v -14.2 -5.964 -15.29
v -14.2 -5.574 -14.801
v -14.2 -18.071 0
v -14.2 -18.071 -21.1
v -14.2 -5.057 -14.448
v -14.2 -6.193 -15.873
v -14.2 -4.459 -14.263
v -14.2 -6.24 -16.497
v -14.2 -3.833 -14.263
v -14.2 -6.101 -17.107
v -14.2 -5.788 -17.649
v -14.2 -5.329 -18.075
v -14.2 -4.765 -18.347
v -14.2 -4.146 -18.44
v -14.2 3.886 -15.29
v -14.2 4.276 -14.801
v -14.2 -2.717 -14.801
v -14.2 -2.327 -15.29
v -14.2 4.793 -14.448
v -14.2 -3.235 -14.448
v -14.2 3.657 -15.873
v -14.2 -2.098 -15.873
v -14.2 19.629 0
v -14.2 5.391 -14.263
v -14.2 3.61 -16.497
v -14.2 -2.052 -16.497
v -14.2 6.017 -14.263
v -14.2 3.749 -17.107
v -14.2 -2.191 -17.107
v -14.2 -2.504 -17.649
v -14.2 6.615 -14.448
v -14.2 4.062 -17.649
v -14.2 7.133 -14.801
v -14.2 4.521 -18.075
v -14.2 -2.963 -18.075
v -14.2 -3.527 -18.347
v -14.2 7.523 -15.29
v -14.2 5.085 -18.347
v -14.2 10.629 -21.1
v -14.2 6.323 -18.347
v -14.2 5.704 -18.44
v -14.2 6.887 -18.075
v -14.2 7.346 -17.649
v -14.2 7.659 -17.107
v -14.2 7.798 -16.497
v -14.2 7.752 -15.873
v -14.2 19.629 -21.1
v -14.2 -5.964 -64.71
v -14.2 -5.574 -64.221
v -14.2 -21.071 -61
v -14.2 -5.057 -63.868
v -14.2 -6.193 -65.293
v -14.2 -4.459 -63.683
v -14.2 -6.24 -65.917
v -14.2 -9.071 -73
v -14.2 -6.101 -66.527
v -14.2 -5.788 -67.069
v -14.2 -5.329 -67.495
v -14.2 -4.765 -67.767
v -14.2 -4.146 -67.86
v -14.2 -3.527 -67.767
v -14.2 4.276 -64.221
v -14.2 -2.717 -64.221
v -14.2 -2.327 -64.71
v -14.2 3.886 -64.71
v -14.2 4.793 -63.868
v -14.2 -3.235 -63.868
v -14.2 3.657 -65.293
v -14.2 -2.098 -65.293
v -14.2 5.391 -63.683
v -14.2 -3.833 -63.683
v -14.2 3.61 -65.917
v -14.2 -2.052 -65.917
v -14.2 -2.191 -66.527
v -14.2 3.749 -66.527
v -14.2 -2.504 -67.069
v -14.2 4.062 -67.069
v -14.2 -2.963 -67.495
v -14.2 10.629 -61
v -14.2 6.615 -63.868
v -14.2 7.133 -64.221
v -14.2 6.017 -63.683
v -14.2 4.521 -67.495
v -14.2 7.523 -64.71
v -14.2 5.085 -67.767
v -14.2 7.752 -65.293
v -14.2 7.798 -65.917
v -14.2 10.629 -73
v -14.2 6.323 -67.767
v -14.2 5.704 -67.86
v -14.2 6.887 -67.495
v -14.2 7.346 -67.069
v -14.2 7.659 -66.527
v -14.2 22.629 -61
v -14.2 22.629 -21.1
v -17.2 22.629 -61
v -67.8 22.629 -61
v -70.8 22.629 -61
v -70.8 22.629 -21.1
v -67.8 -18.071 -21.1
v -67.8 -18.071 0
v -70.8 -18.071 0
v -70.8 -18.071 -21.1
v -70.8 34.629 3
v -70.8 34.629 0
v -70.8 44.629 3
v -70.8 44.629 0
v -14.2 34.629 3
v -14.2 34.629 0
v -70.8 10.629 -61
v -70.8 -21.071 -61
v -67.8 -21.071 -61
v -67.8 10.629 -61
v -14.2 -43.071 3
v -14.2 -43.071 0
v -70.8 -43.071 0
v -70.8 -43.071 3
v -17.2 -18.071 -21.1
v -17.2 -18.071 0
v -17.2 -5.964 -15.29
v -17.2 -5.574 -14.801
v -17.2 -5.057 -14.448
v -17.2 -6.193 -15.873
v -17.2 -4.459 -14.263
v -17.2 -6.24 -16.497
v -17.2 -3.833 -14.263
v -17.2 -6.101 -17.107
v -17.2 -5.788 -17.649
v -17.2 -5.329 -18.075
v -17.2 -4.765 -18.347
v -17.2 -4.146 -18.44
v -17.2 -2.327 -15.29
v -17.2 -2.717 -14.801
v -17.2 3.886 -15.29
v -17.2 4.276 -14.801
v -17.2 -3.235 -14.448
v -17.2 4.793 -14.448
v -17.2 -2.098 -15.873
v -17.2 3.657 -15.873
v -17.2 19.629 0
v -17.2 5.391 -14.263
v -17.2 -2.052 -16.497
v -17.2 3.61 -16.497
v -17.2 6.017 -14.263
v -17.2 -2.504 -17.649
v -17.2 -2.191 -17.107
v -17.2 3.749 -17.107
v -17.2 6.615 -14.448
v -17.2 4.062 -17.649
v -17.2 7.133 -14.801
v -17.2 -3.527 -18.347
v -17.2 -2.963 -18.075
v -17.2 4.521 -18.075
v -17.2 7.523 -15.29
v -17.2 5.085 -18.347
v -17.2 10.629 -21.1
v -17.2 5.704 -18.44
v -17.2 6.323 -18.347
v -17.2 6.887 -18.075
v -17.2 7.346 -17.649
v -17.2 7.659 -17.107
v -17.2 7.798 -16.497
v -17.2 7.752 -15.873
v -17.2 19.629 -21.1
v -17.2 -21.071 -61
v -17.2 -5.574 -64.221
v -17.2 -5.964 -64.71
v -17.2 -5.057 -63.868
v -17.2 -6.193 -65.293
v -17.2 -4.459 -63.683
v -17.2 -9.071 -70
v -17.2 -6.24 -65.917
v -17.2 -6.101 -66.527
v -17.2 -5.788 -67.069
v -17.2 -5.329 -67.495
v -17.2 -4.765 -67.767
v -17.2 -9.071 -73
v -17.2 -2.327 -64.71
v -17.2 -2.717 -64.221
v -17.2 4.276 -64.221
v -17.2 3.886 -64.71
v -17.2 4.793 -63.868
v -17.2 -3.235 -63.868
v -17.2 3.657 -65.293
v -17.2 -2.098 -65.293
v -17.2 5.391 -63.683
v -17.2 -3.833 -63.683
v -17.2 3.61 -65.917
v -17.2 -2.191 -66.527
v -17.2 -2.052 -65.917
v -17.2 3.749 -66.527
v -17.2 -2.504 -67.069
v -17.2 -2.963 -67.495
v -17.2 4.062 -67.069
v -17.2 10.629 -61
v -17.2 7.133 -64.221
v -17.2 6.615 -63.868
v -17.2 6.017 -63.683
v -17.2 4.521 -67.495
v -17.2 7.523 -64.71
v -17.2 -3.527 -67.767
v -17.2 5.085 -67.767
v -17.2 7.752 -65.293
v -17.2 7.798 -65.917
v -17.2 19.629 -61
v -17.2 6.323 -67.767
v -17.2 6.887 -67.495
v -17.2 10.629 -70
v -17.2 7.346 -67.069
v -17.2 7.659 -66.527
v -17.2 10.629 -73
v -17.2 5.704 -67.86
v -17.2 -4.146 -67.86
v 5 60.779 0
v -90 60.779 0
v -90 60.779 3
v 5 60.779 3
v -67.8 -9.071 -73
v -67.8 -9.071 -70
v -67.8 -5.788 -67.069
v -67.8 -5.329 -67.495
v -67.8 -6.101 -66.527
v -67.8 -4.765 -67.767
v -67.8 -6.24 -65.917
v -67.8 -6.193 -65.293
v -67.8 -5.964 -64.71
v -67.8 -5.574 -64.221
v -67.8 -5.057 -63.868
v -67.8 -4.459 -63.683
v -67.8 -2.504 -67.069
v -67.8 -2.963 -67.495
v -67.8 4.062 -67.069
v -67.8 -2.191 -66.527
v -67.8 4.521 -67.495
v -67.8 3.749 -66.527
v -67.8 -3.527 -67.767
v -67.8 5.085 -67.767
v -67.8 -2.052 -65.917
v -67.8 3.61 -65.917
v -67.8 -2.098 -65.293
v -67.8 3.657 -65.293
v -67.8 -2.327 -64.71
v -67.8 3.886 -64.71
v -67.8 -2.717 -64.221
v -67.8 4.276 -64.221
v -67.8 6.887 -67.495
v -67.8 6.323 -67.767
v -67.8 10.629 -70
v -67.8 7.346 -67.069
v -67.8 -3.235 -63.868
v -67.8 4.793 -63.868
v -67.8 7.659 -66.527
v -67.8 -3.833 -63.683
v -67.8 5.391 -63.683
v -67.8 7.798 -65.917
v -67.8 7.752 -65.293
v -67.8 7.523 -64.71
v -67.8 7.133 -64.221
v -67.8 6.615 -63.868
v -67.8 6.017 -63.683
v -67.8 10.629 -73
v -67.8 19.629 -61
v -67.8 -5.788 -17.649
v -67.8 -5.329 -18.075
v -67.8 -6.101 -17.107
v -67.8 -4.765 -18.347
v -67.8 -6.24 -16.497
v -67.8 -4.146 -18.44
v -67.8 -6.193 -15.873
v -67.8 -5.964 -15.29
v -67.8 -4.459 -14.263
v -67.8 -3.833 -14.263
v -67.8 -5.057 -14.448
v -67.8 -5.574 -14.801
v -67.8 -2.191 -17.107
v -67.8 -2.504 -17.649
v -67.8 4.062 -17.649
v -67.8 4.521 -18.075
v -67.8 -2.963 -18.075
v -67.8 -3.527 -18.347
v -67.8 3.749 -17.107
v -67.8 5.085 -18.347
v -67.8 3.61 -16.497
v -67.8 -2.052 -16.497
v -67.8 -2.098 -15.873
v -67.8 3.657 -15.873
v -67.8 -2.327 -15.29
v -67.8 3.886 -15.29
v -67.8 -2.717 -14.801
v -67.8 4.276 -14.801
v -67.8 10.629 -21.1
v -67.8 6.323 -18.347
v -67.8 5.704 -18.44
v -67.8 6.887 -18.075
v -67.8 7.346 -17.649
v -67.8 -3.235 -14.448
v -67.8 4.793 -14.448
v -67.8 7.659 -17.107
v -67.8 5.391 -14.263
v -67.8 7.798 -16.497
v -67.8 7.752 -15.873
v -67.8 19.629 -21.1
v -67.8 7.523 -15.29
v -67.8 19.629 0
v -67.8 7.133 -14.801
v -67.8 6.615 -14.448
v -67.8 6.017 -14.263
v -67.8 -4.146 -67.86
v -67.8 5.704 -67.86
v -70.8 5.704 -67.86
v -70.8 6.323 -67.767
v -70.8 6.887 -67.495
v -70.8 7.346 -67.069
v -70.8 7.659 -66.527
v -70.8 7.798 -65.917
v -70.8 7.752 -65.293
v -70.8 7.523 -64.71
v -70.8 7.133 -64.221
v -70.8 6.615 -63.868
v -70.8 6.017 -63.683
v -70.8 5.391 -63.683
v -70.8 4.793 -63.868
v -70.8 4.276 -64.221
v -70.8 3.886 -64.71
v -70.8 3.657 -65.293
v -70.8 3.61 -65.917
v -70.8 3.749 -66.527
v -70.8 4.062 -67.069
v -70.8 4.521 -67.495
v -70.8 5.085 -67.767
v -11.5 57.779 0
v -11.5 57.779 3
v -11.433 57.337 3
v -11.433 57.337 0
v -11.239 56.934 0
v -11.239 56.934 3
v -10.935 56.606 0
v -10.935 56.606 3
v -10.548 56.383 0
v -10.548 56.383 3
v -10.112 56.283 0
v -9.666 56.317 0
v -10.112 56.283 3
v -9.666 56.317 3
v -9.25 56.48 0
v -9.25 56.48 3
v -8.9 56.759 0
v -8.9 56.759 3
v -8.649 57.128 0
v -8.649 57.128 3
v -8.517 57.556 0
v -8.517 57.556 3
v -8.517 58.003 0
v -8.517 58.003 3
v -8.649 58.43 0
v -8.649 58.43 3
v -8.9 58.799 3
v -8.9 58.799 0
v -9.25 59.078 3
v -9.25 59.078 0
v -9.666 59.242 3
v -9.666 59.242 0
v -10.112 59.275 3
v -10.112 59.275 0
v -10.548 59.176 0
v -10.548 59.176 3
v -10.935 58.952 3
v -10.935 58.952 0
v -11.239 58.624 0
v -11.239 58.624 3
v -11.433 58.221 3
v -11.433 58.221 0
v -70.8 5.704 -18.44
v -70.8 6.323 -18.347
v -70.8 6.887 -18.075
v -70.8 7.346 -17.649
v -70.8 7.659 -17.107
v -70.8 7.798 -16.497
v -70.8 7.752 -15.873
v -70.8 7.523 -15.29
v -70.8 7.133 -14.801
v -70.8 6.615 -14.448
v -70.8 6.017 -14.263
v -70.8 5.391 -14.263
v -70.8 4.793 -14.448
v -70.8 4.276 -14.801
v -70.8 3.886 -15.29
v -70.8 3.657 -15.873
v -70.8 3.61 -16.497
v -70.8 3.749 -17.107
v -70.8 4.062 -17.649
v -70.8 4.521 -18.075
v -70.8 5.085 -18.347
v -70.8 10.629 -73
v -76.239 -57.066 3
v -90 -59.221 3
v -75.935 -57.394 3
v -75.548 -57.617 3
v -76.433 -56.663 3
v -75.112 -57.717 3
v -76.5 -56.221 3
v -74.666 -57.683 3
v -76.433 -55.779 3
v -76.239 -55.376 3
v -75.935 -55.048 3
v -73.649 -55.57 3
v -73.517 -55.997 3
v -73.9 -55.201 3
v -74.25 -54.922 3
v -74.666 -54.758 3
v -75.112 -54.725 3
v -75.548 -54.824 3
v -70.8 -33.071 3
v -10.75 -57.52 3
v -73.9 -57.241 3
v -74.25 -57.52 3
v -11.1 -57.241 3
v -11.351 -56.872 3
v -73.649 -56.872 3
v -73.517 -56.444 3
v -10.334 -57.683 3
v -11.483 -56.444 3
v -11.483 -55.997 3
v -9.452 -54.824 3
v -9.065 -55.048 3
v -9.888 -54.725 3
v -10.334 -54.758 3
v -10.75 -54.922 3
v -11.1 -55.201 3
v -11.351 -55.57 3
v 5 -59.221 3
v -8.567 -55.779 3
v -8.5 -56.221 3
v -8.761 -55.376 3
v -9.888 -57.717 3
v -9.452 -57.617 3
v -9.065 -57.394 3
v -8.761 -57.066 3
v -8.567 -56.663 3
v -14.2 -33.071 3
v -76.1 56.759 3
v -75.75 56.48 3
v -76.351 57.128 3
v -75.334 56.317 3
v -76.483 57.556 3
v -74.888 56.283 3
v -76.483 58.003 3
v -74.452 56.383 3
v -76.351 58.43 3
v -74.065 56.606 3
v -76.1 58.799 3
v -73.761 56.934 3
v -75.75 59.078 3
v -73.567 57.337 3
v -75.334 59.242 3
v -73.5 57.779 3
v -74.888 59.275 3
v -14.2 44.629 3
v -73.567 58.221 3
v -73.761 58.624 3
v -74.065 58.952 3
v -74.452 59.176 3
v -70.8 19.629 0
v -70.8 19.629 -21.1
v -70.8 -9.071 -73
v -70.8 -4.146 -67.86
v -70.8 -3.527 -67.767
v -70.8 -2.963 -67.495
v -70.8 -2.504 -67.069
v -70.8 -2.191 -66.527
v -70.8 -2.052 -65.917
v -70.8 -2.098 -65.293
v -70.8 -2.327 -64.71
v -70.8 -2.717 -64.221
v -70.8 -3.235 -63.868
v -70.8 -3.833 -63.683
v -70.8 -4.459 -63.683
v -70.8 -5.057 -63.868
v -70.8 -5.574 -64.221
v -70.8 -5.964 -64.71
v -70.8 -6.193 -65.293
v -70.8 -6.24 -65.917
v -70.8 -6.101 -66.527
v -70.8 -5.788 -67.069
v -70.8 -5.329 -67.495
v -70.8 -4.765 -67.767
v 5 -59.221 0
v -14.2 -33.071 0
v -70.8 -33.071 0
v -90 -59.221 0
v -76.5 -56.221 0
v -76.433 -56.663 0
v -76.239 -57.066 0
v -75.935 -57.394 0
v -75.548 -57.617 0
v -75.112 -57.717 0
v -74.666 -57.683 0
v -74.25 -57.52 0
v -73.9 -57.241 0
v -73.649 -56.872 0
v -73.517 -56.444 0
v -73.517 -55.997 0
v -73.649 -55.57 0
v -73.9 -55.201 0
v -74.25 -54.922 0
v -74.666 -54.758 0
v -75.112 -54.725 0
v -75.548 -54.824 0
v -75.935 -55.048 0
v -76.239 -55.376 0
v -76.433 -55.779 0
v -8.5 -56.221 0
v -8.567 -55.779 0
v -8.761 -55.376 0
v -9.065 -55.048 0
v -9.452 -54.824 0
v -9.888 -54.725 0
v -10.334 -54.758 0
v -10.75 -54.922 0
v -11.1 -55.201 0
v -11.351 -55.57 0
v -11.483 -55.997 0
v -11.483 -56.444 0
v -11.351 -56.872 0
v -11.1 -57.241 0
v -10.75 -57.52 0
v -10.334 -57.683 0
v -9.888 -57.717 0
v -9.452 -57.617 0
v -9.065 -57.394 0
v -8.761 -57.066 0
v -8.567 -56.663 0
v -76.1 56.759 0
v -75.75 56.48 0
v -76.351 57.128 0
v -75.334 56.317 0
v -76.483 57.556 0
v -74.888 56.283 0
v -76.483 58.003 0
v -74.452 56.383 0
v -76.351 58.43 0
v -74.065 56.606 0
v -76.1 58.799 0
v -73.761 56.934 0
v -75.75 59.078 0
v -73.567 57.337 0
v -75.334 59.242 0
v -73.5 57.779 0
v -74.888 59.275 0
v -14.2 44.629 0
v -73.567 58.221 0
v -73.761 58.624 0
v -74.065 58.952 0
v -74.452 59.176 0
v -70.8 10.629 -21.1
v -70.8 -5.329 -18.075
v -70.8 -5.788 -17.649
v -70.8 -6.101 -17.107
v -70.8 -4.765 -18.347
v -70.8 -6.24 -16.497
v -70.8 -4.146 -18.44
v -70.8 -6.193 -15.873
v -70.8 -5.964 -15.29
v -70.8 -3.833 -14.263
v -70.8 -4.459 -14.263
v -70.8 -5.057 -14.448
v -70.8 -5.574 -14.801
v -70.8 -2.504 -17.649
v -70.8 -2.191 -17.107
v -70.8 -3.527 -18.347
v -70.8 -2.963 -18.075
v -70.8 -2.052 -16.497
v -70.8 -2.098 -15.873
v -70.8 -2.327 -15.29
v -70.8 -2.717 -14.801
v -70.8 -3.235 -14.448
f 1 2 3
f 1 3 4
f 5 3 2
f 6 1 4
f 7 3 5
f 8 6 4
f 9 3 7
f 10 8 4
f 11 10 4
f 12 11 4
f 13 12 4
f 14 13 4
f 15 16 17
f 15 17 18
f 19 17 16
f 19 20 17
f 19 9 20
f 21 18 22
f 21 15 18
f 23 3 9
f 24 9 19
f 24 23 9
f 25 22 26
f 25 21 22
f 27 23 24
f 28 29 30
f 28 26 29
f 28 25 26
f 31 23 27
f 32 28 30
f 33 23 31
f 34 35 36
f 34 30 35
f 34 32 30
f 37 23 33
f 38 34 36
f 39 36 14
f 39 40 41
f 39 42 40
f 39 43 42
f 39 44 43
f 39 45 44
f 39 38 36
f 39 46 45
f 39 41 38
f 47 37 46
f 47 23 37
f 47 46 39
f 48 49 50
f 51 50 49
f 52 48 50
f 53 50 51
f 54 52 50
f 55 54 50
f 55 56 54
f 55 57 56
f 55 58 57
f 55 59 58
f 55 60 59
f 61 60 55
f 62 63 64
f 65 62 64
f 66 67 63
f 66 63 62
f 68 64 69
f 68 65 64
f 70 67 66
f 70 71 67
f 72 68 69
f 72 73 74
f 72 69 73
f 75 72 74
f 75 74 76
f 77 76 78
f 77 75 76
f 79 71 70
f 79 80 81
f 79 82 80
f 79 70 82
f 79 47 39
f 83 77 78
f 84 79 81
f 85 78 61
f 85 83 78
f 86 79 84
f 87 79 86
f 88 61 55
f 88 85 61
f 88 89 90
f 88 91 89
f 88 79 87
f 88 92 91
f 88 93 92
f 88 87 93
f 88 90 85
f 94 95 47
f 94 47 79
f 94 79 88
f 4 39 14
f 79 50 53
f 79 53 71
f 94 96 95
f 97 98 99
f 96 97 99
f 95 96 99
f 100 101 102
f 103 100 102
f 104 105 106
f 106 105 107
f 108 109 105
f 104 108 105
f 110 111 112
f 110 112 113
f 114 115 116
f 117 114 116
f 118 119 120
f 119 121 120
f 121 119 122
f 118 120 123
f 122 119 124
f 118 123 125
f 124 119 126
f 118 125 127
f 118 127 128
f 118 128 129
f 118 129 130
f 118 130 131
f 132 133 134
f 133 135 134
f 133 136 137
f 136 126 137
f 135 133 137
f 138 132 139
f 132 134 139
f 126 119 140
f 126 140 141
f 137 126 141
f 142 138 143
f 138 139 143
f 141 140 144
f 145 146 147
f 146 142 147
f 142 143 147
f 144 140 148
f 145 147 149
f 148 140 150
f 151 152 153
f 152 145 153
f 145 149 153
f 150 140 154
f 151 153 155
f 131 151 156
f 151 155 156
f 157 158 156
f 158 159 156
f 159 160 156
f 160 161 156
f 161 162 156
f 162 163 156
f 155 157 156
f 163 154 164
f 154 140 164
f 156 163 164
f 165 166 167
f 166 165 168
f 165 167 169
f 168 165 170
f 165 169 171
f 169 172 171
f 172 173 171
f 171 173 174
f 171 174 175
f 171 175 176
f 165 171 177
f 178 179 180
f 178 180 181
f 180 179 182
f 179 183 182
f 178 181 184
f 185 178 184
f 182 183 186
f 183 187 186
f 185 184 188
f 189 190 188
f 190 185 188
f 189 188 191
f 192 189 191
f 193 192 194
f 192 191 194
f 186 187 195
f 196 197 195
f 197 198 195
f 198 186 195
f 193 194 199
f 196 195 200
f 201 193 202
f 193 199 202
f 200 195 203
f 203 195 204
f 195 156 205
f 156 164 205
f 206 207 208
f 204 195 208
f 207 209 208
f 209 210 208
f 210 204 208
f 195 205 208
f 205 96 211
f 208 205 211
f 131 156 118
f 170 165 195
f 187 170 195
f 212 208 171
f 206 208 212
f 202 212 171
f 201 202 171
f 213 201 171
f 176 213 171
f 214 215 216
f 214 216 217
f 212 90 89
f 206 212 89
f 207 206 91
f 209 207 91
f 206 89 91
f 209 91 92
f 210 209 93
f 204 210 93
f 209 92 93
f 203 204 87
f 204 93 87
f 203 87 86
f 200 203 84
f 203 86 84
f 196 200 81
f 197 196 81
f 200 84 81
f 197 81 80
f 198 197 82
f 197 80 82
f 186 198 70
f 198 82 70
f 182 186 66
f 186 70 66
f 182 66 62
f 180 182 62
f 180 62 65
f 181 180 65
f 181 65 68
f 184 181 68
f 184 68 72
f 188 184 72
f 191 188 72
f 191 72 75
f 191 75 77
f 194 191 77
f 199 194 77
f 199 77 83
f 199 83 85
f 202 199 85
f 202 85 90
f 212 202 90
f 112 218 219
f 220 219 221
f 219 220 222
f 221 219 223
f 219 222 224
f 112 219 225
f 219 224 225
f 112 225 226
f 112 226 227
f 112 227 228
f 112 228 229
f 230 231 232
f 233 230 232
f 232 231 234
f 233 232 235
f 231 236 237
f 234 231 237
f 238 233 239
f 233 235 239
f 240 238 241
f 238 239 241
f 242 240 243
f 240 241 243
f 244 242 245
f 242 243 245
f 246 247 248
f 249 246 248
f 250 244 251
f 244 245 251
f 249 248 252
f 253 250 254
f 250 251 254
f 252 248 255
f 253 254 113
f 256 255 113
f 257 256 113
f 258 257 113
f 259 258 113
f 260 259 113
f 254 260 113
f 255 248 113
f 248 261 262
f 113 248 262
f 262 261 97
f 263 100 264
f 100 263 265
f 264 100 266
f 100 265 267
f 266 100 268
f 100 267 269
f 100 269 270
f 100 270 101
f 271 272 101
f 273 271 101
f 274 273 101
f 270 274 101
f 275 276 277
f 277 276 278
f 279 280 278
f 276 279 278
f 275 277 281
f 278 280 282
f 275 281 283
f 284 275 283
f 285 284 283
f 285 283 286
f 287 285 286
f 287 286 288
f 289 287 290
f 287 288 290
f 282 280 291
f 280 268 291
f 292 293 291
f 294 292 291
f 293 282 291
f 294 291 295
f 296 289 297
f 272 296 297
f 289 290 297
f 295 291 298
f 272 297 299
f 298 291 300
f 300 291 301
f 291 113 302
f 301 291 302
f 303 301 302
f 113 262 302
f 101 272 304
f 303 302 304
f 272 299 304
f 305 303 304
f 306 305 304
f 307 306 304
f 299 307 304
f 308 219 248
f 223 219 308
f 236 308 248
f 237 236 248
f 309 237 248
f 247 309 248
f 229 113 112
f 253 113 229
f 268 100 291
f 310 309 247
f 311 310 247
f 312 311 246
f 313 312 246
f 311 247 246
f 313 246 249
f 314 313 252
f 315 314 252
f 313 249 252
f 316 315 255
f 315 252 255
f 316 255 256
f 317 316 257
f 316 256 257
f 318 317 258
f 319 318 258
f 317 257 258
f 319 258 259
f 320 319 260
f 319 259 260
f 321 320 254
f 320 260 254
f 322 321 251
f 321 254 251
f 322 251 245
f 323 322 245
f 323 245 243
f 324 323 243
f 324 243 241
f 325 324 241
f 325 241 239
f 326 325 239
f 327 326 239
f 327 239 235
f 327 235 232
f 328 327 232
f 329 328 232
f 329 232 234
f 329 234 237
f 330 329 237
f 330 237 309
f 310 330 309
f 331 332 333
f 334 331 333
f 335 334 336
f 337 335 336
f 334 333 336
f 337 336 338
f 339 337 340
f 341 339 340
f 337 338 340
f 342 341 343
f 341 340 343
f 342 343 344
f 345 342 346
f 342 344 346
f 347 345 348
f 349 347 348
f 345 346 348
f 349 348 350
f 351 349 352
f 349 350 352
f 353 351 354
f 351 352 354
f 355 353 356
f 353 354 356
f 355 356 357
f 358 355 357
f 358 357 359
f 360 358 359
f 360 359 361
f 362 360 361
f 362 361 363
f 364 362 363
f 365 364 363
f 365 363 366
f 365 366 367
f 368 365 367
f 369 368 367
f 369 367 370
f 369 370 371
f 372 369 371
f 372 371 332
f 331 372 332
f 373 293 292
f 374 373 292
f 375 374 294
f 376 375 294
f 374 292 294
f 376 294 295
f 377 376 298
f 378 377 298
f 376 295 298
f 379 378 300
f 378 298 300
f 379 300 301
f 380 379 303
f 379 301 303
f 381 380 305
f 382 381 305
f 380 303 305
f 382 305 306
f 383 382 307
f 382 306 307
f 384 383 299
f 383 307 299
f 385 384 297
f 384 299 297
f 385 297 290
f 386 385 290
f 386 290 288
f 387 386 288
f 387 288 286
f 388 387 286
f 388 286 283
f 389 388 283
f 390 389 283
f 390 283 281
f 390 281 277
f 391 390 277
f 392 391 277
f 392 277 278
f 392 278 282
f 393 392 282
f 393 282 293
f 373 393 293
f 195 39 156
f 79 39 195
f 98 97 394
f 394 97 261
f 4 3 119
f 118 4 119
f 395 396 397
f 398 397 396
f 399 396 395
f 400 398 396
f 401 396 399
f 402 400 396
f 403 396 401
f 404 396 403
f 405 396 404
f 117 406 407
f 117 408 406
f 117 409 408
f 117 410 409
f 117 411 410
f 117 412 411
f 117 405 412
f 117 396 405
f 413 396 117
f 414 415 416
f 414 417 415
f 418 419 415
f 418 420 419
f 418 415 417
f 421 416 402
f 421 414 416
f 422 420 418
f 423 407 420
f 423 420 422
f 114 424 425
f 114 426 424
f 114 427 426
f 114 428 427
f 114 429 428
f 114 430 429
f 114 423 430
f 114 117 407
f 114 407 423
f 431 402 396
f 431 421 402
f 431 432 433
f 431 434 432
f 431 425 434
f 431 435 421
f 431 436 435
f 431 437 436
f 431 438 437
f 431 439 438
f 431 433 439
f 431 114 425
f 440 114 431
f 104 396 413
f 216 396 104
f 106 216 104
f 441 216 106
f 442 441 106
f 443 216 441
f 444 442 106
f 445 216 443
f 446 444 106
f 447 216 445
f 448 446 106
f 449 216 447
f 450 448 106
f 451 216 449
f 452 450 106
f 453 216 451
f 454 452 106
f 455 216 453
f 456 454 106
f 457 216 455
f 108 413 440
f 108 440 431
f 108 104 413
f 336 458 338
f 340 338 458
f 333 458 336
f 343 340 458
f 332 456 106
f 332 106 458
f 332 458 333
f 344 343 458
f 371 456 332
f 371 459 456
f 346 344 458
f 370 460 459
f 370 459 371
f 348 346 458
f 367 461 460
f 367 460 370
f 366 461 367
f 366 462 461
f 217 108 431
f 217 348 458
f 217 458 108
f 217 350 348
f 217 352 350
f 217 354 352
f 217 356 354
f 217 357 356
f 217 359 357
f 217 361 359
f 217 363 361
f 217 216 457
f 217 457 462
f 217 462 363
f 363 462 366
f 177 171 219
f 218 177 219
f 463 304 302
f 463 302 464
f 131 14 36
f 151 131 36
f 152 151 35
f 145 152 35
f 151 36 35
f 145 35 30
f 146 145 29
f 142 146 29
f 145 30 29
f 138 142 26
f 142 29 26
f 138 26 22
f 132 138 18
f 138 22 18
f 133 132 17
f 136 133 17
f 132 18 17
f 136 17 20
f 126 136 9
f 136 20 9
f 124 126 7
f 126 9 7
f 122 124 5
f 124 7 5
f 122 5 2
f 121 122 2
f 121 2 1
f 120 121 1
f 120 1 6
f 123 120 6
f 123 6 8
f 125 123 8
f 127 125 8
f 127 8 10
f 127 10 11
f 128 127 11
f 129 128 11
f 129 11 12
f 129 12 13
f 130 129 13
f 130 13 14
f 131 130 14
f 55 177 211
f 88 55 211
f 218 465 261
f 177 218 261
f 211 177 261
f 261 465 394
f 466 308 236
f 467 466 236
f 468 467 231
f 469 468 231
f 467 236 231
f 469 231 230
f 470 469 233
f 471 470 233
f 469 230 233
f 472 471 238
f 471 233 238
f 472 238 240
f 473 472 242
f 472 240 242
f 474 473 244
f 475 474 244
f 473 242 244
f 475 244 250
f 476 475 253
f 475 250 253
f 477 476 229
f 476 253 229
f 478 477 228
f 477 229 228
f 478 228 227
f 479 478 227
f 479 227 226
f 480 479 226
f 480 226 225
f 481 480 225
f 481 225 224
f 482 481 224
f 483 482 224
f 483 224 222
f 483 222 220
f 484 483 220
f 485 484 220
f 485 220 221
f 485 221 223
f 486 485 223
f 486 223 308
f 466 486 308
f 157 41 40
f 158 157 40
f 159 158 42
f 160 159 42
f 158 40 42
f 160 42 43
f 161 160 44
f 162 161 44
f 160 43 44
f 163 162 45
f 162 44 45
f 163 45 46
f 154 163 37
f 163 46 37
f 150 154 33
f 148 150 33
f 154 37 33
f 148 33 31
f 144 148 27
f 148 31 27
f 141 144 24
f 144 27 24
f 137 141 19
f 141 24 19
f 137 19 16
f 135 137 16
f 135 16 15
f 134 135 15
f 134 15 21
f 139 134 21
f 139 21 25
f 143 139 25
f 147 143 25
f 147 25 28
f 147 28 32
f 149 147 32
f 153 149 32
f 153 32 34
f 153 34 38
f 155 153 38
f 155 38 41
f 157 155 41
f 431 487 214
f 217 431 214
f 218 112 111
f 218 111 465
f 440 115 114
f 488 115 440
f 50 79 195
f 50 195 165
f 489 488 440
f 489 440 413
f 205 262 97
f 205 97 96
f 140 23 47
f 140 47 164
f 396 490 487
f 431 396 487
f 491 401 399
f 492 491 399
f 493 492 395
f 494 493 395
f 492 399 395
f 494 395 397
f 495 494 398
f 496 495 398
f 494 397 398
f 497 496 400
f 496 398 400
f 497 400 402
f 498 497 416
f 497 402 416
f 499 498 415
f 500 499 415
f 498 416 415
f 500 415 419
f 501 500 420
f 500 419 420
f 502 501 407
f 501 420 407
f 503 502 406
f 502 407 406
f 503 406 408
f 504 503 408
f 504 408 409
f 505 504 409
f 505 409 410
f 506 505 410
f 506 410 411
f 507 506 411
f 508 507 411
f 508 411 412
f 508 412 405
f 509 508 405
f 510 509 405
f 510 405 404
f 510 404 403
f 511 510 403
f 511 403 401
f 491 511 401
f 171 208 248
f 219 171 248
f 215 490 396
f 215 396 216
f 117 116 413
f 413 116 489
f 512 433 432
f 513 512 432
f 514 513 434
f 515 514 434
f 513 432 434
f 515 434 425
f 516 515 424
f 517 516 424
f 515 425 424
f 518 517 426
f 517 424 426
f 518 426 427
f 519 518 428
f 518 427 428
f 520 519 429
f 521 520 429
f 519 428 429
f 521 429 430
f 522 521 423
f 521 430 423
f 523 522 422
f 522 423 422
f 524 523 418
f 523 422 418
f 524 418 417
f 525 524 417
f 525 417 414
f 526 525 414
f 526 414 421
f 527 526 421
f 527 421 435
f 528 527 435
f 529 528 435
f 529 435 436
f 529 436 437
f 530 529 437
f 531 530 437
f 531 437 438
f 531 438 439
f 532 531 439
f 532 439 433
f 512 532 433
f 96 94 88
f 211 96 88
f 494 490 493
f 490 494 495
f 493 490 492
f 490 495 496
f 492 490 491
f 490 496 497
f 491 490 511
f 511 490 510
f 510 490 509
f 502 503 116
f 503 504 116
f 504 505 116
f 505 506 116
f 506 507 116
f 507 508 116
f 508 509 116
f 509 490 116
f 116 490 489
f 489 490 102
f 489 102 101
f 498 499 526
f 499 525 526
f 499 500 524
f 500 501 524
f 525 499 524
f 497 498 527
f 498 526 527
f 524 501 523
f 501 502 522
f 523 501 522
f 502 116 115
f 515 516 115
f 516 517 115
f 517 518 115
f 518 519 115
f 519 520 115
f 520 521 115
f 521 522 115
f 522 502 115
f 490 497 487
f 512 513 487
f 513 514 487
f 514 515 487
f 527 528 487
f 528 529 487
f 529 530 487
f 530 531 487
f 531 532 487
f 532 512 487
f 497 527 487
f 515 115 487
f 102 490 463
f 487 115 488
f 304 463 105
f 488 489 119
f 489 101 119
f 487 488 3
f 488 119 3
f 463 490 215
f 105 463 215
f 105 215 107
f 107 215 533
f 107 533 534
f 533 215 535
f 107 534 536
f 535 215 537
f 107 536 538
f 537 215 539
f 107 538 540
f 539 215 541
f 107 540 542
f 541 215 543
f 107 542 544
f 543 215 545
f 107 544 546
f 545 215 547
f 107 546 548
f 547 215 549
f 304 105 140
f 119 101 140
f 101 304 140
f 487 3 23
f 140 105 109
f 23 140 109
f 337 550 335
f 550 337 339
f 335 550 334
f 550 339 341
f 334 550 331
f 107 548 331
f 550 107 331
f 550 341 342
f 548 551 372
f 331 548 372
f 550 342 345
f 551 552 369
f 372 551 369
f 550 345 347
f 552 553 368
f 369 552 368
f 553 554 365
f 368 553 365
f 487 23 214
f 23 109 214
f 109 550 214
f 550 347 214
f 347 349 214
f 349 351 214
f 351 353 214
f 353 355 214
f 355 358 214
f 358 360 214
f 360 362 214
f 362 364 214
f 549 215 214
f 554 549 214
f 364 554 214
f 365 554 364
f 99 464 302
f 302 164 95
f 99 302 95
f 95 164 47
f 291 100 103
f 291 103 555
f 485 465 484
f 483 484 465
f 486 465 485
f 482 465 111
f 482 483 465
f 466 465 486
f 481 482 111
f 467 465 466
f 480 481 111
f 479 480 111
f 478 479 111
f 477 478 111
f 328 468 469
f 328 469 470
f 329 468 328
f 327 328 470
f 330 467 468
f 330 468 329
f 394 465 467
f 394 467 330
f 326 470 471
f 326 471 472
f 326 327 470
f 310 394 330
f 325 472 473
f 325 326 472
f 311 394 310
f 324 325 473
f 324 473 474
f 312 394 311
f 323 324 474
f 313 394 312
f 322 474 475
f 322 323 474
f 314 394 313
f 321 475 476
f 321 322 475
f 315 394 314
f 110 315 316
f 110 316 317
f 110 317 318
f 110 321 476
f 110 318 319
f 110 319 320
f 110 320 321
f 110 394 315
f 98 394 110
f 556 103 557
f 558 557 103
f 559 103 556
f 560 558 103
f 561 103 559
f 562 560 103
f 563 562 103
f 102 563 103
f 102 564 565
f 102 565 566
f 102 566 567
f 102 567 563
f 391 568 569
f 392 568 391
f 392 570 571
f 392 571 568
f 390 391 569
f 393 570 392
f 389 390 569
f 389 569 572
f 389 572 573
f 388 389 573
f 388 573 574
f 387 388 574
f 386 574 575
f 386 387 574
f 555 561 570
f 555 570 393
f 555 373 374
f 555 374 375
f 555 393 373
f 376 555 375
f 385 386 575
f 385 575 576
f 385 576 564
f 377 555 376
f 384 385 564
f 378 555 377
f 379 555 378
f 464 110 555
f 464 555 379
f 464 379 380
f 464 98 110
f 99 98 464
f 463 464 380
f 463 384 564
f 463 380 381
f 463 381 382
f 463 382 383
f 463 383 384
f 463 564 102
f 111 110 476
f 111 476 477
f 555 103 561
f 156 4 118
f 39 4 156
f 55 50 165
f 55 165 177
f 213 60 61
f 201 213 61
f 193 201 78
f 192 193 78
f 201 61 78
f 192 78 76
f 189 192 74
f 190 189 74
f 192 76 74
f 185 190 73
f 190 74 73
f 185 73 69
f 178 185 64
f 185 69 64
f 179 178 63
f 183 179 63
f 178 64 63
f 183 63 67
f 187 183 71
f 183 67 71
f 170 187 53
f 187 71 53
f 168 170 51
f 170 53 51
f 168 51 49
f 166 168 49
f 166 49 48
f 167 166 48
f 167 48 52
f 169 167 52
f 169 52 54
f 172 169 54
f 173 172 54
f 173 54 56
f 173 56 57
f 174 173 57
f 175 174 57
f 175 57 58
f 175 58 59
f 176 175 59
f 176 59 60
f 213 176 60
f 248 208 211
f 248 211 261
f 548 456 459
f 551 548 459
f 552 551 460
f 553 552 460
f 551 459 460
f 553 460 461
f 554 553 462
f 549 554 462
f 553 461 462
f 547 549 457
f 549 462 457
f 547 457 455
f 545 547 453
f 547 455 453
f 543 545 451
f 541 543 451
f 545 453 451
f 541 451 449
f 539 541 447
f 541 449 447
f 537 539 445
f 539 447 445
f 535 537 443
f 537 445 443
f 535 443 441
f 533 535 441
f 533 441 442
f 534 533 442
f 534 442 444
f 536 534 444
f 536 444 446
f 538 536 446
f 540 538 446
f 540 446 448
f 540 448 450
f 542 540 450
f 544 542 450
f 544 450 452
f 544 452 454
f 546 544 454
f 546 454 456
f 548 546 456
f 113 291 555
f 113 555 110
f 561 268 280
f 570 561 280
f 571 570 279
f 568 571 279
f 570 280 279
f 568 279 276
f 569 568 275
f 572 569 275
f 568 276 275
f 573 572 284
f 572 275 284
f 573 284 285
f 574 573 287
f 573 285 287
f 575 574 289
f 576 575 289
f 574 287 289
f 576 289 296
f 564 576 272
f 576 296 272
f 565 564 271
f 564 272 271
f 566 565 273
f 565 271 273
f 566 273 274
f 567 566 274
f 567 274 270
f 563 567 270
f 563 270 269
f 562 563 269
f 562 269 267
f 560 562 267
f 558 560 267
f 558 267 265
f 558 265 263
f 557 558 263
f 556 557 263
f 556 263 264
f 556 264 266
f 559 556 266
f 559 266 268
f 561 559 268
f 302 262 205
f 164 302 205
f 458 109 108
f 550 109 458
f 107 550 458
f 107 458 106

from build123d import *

# Parameters (mm, degrees)
SKETCH_1_W          = 95
SKETCH_1_H          = 120
EXTRUDE_1_DEPTH     = 3
SKETCH_2_W          = 3
SKETCH_2_H          = 37.7
EXTRUDE_2_DEPTH     = 70
SKETCH_3_W          = 39.9
SKETCH_3_H          = 19.7
SKETCH_3_R          = 2.1
CUT_EXTRUDE_1_DEPTH = 61
SKETCH_4_R          = 1.5
CUT_EXTRUDE_2_DEPTH = 10
SKETCH_5_W          = 56.6
SKETCH_5_H          = 19.7
EXTRUDE_3_DEPTH     = 3
SKETCH_6_W          = 56.6
SKETCH_6_H          = 39.9
EXTRUDE_4_DEPTH     = 3
EXTRUDE_5_DEPTH     = 3
SKETCH_9_W          = 12
SKETCH_9_H          = 12
EXTRUDE_6_DEPTH     = 3
SKETCH_10_W         = 39.9
SKETCH_10_H         = 9
CUT_EXTRUDE_4_DEPTH = 74
SKETCH_13_W         = 56.6
SKETCH_13_H         = 10
CUT_EXTRUDE_5_DEPTH = 14


with BuildPart() as part:
    # 草图1 → 凸台-拉伸1 (new body)
    with BuildSketch(Plane.XY):
        with Locations((-42.5, 0.779220779)):
            Rectangle(SKETCH_1_W, SKETCH_1_H)
    extrude(amount=EXTRUDE_1_DEPTH)

    # 草图2 → 凸台-拉伸2 (add)
    with BuildSketch(Plane(origin=(0, 0, 0), x_dir=(-1, 0, 0), z_dir=(0, 0, -1))):
        with Locations((15.7, 0.779220779)):
            Rectangle(SKETCH_2_W, SKETCH_2_H)
        with Locations((69.3, 0.779220779)):
            Rectangle(SKETCH_2_W, SKETCH_2_H)
    extrude(amount=EXTRUDE_2_DEPTH)

    # 草图3 → 切除-拉伸1 (cut)
    with BuildSketch(Plane(origin=(-14.2, 0, 0), x_dir=(0, 0, -1), z_dir=(1, 0, 0))):
        with Locations((41.05, 0.779220779)):
            Rectangle(SKETCH_3_W, SKETCH_3_H)
        with Locations((16.34, -4.145779221)):
            Circle(SKETCH_3_R)
        with Locations((65.76, 5.704220779)):
            Circle(SKETCH_3_R)
        with Locations((65.76, -4.145779221)):
            Circle(SKETCH_3_R)
        with Locations((16.34, 5.704220779)):
            Circle(SKETCH_3_R)
    extrude(amount=-CUT_EXTRUDE_1_DEPTH, mode=Mode.SUBTRACT)

    # 草图4 → 切除-拉伸2 (cut)
    with BuildSketch(Plane.XY.offset(3)):
        with Locations((-75, 57.779220779)):
            Circle(SKETCH_4_R)
        with Locations(Location((-10, 57.779220779, 0), (0, 0, 180))):
            Circle(SKETCH_4_R)
        with Locations((-10, -56.220779221)):
            Circle(SKETCH_4_R)
        with Locations(Location((-75, -56.220779221, 0), (0, 0, 180))):
            Circle(SKETCH_4_R)
    extrude(amount=-CUT_EXTRUDE_2_DEPTH, mode=Mode.SUBTRACT)

    # 草图5 → 凸台-拉伸3 (add)
    with BuildSketch(Plane(origin=(0, 0, -70), x_dir=(-1, 0, 0), z_dir=(0, 0, -1))):
        with Locations((42.5, 0.779220779)):
            Rectangle(SKETCH_5_W, SKETCH_5_H)
    extrude(amount=EXTRUDE_3_DEPTH)

    # 草图6 → 凸台-拉伸4 (add)
    with BuildSketch(Plane(origin=(0, 19.629220779, 0), x_dir=(1, 0, 0), z_dir=(0, 1, 0))):
        with Locations((-42.5, 41.05)):
            Rectangle(SKETCH_6_W, SKETCH_6_H)
    extrude(amount=EXTRUDE_4_DEPTH)

    # 草图8 → 凸台-拉伸5 (add)
    with BuildSketch(Plane(origin=(-14.2, 0, 0), x_dir=(0, 0, -1), z_dir=(1, 0, 0))):
        Polygon((61, 22.629220779), (61, 19.629220779), (70, 19.629220779), (70, 10.629220779), (73, 10.629220779), (73, 22.629220779), align=None)
        Polygon((73, -9.070779221), (70, -9.070779221), (70, -18.070779221), (61, -18.070779221), (61, -21.070779221), (73, -21.070779221), align=None)
    extrude(amount=-EXTRUDE_5_DEPTH)

    # 草图9 → 凸台-拉伸6 (add)
    with BuildSketch(Plane.ZY.offset(70.8)):
        with Locations((-67, 16.629220779)):
            Rectangle(SKETCH_9_W, SKETCH_9_H)
        with Locations((-67, -15.070779221)):
            Rectangle(SKETCH_9_W, SKETCH_9_H)
    extrude(amount=-EXTRUDE_6_DEPTH)

    # 草图10 → 切除-拉伸4 (cut)
    with BuildSketch(Plane(origin=(-14.2, 0, 0), x_dir=(0, 0, -1), z_dir=(1, 0, 0))):
        Polygon((73, 10.629220779), (73, 22.629220779), (61, 22.629220779), align=None)
        Polygon((73, -9.070779221), (73, -21.070779221), (61, -21.070779221), align=None)
        with Locations((41.05, -13.570779221)):
            Rectangle(SKETCH_10_W, SKETCH_10_H)
    extrude(amount=-CUT_EXTRUDE_4_DEPTH, mode=Mode.SUBTRACT)

    # 草图13 → 切除-拉伸5 (cut)
    with BuildSketch(Plane(origin=(0, 0, 0), x_dir=(-1, 0, 0), z_dir=(0, 0, -1))):
        with Locations((42.5, 39.629220779)):
            Rectangle(SKETCH_13_W, SKETCH_13_H)
        with Locations((42.5, -38.070779221)):
            Rectangle(SKETCH_13_W, SKETCH_13_H)
    extrude(amount=-CUT_EXTRUDE_5_DEPTH, mode=Mode.SUBTRACT)


solid = part.part
